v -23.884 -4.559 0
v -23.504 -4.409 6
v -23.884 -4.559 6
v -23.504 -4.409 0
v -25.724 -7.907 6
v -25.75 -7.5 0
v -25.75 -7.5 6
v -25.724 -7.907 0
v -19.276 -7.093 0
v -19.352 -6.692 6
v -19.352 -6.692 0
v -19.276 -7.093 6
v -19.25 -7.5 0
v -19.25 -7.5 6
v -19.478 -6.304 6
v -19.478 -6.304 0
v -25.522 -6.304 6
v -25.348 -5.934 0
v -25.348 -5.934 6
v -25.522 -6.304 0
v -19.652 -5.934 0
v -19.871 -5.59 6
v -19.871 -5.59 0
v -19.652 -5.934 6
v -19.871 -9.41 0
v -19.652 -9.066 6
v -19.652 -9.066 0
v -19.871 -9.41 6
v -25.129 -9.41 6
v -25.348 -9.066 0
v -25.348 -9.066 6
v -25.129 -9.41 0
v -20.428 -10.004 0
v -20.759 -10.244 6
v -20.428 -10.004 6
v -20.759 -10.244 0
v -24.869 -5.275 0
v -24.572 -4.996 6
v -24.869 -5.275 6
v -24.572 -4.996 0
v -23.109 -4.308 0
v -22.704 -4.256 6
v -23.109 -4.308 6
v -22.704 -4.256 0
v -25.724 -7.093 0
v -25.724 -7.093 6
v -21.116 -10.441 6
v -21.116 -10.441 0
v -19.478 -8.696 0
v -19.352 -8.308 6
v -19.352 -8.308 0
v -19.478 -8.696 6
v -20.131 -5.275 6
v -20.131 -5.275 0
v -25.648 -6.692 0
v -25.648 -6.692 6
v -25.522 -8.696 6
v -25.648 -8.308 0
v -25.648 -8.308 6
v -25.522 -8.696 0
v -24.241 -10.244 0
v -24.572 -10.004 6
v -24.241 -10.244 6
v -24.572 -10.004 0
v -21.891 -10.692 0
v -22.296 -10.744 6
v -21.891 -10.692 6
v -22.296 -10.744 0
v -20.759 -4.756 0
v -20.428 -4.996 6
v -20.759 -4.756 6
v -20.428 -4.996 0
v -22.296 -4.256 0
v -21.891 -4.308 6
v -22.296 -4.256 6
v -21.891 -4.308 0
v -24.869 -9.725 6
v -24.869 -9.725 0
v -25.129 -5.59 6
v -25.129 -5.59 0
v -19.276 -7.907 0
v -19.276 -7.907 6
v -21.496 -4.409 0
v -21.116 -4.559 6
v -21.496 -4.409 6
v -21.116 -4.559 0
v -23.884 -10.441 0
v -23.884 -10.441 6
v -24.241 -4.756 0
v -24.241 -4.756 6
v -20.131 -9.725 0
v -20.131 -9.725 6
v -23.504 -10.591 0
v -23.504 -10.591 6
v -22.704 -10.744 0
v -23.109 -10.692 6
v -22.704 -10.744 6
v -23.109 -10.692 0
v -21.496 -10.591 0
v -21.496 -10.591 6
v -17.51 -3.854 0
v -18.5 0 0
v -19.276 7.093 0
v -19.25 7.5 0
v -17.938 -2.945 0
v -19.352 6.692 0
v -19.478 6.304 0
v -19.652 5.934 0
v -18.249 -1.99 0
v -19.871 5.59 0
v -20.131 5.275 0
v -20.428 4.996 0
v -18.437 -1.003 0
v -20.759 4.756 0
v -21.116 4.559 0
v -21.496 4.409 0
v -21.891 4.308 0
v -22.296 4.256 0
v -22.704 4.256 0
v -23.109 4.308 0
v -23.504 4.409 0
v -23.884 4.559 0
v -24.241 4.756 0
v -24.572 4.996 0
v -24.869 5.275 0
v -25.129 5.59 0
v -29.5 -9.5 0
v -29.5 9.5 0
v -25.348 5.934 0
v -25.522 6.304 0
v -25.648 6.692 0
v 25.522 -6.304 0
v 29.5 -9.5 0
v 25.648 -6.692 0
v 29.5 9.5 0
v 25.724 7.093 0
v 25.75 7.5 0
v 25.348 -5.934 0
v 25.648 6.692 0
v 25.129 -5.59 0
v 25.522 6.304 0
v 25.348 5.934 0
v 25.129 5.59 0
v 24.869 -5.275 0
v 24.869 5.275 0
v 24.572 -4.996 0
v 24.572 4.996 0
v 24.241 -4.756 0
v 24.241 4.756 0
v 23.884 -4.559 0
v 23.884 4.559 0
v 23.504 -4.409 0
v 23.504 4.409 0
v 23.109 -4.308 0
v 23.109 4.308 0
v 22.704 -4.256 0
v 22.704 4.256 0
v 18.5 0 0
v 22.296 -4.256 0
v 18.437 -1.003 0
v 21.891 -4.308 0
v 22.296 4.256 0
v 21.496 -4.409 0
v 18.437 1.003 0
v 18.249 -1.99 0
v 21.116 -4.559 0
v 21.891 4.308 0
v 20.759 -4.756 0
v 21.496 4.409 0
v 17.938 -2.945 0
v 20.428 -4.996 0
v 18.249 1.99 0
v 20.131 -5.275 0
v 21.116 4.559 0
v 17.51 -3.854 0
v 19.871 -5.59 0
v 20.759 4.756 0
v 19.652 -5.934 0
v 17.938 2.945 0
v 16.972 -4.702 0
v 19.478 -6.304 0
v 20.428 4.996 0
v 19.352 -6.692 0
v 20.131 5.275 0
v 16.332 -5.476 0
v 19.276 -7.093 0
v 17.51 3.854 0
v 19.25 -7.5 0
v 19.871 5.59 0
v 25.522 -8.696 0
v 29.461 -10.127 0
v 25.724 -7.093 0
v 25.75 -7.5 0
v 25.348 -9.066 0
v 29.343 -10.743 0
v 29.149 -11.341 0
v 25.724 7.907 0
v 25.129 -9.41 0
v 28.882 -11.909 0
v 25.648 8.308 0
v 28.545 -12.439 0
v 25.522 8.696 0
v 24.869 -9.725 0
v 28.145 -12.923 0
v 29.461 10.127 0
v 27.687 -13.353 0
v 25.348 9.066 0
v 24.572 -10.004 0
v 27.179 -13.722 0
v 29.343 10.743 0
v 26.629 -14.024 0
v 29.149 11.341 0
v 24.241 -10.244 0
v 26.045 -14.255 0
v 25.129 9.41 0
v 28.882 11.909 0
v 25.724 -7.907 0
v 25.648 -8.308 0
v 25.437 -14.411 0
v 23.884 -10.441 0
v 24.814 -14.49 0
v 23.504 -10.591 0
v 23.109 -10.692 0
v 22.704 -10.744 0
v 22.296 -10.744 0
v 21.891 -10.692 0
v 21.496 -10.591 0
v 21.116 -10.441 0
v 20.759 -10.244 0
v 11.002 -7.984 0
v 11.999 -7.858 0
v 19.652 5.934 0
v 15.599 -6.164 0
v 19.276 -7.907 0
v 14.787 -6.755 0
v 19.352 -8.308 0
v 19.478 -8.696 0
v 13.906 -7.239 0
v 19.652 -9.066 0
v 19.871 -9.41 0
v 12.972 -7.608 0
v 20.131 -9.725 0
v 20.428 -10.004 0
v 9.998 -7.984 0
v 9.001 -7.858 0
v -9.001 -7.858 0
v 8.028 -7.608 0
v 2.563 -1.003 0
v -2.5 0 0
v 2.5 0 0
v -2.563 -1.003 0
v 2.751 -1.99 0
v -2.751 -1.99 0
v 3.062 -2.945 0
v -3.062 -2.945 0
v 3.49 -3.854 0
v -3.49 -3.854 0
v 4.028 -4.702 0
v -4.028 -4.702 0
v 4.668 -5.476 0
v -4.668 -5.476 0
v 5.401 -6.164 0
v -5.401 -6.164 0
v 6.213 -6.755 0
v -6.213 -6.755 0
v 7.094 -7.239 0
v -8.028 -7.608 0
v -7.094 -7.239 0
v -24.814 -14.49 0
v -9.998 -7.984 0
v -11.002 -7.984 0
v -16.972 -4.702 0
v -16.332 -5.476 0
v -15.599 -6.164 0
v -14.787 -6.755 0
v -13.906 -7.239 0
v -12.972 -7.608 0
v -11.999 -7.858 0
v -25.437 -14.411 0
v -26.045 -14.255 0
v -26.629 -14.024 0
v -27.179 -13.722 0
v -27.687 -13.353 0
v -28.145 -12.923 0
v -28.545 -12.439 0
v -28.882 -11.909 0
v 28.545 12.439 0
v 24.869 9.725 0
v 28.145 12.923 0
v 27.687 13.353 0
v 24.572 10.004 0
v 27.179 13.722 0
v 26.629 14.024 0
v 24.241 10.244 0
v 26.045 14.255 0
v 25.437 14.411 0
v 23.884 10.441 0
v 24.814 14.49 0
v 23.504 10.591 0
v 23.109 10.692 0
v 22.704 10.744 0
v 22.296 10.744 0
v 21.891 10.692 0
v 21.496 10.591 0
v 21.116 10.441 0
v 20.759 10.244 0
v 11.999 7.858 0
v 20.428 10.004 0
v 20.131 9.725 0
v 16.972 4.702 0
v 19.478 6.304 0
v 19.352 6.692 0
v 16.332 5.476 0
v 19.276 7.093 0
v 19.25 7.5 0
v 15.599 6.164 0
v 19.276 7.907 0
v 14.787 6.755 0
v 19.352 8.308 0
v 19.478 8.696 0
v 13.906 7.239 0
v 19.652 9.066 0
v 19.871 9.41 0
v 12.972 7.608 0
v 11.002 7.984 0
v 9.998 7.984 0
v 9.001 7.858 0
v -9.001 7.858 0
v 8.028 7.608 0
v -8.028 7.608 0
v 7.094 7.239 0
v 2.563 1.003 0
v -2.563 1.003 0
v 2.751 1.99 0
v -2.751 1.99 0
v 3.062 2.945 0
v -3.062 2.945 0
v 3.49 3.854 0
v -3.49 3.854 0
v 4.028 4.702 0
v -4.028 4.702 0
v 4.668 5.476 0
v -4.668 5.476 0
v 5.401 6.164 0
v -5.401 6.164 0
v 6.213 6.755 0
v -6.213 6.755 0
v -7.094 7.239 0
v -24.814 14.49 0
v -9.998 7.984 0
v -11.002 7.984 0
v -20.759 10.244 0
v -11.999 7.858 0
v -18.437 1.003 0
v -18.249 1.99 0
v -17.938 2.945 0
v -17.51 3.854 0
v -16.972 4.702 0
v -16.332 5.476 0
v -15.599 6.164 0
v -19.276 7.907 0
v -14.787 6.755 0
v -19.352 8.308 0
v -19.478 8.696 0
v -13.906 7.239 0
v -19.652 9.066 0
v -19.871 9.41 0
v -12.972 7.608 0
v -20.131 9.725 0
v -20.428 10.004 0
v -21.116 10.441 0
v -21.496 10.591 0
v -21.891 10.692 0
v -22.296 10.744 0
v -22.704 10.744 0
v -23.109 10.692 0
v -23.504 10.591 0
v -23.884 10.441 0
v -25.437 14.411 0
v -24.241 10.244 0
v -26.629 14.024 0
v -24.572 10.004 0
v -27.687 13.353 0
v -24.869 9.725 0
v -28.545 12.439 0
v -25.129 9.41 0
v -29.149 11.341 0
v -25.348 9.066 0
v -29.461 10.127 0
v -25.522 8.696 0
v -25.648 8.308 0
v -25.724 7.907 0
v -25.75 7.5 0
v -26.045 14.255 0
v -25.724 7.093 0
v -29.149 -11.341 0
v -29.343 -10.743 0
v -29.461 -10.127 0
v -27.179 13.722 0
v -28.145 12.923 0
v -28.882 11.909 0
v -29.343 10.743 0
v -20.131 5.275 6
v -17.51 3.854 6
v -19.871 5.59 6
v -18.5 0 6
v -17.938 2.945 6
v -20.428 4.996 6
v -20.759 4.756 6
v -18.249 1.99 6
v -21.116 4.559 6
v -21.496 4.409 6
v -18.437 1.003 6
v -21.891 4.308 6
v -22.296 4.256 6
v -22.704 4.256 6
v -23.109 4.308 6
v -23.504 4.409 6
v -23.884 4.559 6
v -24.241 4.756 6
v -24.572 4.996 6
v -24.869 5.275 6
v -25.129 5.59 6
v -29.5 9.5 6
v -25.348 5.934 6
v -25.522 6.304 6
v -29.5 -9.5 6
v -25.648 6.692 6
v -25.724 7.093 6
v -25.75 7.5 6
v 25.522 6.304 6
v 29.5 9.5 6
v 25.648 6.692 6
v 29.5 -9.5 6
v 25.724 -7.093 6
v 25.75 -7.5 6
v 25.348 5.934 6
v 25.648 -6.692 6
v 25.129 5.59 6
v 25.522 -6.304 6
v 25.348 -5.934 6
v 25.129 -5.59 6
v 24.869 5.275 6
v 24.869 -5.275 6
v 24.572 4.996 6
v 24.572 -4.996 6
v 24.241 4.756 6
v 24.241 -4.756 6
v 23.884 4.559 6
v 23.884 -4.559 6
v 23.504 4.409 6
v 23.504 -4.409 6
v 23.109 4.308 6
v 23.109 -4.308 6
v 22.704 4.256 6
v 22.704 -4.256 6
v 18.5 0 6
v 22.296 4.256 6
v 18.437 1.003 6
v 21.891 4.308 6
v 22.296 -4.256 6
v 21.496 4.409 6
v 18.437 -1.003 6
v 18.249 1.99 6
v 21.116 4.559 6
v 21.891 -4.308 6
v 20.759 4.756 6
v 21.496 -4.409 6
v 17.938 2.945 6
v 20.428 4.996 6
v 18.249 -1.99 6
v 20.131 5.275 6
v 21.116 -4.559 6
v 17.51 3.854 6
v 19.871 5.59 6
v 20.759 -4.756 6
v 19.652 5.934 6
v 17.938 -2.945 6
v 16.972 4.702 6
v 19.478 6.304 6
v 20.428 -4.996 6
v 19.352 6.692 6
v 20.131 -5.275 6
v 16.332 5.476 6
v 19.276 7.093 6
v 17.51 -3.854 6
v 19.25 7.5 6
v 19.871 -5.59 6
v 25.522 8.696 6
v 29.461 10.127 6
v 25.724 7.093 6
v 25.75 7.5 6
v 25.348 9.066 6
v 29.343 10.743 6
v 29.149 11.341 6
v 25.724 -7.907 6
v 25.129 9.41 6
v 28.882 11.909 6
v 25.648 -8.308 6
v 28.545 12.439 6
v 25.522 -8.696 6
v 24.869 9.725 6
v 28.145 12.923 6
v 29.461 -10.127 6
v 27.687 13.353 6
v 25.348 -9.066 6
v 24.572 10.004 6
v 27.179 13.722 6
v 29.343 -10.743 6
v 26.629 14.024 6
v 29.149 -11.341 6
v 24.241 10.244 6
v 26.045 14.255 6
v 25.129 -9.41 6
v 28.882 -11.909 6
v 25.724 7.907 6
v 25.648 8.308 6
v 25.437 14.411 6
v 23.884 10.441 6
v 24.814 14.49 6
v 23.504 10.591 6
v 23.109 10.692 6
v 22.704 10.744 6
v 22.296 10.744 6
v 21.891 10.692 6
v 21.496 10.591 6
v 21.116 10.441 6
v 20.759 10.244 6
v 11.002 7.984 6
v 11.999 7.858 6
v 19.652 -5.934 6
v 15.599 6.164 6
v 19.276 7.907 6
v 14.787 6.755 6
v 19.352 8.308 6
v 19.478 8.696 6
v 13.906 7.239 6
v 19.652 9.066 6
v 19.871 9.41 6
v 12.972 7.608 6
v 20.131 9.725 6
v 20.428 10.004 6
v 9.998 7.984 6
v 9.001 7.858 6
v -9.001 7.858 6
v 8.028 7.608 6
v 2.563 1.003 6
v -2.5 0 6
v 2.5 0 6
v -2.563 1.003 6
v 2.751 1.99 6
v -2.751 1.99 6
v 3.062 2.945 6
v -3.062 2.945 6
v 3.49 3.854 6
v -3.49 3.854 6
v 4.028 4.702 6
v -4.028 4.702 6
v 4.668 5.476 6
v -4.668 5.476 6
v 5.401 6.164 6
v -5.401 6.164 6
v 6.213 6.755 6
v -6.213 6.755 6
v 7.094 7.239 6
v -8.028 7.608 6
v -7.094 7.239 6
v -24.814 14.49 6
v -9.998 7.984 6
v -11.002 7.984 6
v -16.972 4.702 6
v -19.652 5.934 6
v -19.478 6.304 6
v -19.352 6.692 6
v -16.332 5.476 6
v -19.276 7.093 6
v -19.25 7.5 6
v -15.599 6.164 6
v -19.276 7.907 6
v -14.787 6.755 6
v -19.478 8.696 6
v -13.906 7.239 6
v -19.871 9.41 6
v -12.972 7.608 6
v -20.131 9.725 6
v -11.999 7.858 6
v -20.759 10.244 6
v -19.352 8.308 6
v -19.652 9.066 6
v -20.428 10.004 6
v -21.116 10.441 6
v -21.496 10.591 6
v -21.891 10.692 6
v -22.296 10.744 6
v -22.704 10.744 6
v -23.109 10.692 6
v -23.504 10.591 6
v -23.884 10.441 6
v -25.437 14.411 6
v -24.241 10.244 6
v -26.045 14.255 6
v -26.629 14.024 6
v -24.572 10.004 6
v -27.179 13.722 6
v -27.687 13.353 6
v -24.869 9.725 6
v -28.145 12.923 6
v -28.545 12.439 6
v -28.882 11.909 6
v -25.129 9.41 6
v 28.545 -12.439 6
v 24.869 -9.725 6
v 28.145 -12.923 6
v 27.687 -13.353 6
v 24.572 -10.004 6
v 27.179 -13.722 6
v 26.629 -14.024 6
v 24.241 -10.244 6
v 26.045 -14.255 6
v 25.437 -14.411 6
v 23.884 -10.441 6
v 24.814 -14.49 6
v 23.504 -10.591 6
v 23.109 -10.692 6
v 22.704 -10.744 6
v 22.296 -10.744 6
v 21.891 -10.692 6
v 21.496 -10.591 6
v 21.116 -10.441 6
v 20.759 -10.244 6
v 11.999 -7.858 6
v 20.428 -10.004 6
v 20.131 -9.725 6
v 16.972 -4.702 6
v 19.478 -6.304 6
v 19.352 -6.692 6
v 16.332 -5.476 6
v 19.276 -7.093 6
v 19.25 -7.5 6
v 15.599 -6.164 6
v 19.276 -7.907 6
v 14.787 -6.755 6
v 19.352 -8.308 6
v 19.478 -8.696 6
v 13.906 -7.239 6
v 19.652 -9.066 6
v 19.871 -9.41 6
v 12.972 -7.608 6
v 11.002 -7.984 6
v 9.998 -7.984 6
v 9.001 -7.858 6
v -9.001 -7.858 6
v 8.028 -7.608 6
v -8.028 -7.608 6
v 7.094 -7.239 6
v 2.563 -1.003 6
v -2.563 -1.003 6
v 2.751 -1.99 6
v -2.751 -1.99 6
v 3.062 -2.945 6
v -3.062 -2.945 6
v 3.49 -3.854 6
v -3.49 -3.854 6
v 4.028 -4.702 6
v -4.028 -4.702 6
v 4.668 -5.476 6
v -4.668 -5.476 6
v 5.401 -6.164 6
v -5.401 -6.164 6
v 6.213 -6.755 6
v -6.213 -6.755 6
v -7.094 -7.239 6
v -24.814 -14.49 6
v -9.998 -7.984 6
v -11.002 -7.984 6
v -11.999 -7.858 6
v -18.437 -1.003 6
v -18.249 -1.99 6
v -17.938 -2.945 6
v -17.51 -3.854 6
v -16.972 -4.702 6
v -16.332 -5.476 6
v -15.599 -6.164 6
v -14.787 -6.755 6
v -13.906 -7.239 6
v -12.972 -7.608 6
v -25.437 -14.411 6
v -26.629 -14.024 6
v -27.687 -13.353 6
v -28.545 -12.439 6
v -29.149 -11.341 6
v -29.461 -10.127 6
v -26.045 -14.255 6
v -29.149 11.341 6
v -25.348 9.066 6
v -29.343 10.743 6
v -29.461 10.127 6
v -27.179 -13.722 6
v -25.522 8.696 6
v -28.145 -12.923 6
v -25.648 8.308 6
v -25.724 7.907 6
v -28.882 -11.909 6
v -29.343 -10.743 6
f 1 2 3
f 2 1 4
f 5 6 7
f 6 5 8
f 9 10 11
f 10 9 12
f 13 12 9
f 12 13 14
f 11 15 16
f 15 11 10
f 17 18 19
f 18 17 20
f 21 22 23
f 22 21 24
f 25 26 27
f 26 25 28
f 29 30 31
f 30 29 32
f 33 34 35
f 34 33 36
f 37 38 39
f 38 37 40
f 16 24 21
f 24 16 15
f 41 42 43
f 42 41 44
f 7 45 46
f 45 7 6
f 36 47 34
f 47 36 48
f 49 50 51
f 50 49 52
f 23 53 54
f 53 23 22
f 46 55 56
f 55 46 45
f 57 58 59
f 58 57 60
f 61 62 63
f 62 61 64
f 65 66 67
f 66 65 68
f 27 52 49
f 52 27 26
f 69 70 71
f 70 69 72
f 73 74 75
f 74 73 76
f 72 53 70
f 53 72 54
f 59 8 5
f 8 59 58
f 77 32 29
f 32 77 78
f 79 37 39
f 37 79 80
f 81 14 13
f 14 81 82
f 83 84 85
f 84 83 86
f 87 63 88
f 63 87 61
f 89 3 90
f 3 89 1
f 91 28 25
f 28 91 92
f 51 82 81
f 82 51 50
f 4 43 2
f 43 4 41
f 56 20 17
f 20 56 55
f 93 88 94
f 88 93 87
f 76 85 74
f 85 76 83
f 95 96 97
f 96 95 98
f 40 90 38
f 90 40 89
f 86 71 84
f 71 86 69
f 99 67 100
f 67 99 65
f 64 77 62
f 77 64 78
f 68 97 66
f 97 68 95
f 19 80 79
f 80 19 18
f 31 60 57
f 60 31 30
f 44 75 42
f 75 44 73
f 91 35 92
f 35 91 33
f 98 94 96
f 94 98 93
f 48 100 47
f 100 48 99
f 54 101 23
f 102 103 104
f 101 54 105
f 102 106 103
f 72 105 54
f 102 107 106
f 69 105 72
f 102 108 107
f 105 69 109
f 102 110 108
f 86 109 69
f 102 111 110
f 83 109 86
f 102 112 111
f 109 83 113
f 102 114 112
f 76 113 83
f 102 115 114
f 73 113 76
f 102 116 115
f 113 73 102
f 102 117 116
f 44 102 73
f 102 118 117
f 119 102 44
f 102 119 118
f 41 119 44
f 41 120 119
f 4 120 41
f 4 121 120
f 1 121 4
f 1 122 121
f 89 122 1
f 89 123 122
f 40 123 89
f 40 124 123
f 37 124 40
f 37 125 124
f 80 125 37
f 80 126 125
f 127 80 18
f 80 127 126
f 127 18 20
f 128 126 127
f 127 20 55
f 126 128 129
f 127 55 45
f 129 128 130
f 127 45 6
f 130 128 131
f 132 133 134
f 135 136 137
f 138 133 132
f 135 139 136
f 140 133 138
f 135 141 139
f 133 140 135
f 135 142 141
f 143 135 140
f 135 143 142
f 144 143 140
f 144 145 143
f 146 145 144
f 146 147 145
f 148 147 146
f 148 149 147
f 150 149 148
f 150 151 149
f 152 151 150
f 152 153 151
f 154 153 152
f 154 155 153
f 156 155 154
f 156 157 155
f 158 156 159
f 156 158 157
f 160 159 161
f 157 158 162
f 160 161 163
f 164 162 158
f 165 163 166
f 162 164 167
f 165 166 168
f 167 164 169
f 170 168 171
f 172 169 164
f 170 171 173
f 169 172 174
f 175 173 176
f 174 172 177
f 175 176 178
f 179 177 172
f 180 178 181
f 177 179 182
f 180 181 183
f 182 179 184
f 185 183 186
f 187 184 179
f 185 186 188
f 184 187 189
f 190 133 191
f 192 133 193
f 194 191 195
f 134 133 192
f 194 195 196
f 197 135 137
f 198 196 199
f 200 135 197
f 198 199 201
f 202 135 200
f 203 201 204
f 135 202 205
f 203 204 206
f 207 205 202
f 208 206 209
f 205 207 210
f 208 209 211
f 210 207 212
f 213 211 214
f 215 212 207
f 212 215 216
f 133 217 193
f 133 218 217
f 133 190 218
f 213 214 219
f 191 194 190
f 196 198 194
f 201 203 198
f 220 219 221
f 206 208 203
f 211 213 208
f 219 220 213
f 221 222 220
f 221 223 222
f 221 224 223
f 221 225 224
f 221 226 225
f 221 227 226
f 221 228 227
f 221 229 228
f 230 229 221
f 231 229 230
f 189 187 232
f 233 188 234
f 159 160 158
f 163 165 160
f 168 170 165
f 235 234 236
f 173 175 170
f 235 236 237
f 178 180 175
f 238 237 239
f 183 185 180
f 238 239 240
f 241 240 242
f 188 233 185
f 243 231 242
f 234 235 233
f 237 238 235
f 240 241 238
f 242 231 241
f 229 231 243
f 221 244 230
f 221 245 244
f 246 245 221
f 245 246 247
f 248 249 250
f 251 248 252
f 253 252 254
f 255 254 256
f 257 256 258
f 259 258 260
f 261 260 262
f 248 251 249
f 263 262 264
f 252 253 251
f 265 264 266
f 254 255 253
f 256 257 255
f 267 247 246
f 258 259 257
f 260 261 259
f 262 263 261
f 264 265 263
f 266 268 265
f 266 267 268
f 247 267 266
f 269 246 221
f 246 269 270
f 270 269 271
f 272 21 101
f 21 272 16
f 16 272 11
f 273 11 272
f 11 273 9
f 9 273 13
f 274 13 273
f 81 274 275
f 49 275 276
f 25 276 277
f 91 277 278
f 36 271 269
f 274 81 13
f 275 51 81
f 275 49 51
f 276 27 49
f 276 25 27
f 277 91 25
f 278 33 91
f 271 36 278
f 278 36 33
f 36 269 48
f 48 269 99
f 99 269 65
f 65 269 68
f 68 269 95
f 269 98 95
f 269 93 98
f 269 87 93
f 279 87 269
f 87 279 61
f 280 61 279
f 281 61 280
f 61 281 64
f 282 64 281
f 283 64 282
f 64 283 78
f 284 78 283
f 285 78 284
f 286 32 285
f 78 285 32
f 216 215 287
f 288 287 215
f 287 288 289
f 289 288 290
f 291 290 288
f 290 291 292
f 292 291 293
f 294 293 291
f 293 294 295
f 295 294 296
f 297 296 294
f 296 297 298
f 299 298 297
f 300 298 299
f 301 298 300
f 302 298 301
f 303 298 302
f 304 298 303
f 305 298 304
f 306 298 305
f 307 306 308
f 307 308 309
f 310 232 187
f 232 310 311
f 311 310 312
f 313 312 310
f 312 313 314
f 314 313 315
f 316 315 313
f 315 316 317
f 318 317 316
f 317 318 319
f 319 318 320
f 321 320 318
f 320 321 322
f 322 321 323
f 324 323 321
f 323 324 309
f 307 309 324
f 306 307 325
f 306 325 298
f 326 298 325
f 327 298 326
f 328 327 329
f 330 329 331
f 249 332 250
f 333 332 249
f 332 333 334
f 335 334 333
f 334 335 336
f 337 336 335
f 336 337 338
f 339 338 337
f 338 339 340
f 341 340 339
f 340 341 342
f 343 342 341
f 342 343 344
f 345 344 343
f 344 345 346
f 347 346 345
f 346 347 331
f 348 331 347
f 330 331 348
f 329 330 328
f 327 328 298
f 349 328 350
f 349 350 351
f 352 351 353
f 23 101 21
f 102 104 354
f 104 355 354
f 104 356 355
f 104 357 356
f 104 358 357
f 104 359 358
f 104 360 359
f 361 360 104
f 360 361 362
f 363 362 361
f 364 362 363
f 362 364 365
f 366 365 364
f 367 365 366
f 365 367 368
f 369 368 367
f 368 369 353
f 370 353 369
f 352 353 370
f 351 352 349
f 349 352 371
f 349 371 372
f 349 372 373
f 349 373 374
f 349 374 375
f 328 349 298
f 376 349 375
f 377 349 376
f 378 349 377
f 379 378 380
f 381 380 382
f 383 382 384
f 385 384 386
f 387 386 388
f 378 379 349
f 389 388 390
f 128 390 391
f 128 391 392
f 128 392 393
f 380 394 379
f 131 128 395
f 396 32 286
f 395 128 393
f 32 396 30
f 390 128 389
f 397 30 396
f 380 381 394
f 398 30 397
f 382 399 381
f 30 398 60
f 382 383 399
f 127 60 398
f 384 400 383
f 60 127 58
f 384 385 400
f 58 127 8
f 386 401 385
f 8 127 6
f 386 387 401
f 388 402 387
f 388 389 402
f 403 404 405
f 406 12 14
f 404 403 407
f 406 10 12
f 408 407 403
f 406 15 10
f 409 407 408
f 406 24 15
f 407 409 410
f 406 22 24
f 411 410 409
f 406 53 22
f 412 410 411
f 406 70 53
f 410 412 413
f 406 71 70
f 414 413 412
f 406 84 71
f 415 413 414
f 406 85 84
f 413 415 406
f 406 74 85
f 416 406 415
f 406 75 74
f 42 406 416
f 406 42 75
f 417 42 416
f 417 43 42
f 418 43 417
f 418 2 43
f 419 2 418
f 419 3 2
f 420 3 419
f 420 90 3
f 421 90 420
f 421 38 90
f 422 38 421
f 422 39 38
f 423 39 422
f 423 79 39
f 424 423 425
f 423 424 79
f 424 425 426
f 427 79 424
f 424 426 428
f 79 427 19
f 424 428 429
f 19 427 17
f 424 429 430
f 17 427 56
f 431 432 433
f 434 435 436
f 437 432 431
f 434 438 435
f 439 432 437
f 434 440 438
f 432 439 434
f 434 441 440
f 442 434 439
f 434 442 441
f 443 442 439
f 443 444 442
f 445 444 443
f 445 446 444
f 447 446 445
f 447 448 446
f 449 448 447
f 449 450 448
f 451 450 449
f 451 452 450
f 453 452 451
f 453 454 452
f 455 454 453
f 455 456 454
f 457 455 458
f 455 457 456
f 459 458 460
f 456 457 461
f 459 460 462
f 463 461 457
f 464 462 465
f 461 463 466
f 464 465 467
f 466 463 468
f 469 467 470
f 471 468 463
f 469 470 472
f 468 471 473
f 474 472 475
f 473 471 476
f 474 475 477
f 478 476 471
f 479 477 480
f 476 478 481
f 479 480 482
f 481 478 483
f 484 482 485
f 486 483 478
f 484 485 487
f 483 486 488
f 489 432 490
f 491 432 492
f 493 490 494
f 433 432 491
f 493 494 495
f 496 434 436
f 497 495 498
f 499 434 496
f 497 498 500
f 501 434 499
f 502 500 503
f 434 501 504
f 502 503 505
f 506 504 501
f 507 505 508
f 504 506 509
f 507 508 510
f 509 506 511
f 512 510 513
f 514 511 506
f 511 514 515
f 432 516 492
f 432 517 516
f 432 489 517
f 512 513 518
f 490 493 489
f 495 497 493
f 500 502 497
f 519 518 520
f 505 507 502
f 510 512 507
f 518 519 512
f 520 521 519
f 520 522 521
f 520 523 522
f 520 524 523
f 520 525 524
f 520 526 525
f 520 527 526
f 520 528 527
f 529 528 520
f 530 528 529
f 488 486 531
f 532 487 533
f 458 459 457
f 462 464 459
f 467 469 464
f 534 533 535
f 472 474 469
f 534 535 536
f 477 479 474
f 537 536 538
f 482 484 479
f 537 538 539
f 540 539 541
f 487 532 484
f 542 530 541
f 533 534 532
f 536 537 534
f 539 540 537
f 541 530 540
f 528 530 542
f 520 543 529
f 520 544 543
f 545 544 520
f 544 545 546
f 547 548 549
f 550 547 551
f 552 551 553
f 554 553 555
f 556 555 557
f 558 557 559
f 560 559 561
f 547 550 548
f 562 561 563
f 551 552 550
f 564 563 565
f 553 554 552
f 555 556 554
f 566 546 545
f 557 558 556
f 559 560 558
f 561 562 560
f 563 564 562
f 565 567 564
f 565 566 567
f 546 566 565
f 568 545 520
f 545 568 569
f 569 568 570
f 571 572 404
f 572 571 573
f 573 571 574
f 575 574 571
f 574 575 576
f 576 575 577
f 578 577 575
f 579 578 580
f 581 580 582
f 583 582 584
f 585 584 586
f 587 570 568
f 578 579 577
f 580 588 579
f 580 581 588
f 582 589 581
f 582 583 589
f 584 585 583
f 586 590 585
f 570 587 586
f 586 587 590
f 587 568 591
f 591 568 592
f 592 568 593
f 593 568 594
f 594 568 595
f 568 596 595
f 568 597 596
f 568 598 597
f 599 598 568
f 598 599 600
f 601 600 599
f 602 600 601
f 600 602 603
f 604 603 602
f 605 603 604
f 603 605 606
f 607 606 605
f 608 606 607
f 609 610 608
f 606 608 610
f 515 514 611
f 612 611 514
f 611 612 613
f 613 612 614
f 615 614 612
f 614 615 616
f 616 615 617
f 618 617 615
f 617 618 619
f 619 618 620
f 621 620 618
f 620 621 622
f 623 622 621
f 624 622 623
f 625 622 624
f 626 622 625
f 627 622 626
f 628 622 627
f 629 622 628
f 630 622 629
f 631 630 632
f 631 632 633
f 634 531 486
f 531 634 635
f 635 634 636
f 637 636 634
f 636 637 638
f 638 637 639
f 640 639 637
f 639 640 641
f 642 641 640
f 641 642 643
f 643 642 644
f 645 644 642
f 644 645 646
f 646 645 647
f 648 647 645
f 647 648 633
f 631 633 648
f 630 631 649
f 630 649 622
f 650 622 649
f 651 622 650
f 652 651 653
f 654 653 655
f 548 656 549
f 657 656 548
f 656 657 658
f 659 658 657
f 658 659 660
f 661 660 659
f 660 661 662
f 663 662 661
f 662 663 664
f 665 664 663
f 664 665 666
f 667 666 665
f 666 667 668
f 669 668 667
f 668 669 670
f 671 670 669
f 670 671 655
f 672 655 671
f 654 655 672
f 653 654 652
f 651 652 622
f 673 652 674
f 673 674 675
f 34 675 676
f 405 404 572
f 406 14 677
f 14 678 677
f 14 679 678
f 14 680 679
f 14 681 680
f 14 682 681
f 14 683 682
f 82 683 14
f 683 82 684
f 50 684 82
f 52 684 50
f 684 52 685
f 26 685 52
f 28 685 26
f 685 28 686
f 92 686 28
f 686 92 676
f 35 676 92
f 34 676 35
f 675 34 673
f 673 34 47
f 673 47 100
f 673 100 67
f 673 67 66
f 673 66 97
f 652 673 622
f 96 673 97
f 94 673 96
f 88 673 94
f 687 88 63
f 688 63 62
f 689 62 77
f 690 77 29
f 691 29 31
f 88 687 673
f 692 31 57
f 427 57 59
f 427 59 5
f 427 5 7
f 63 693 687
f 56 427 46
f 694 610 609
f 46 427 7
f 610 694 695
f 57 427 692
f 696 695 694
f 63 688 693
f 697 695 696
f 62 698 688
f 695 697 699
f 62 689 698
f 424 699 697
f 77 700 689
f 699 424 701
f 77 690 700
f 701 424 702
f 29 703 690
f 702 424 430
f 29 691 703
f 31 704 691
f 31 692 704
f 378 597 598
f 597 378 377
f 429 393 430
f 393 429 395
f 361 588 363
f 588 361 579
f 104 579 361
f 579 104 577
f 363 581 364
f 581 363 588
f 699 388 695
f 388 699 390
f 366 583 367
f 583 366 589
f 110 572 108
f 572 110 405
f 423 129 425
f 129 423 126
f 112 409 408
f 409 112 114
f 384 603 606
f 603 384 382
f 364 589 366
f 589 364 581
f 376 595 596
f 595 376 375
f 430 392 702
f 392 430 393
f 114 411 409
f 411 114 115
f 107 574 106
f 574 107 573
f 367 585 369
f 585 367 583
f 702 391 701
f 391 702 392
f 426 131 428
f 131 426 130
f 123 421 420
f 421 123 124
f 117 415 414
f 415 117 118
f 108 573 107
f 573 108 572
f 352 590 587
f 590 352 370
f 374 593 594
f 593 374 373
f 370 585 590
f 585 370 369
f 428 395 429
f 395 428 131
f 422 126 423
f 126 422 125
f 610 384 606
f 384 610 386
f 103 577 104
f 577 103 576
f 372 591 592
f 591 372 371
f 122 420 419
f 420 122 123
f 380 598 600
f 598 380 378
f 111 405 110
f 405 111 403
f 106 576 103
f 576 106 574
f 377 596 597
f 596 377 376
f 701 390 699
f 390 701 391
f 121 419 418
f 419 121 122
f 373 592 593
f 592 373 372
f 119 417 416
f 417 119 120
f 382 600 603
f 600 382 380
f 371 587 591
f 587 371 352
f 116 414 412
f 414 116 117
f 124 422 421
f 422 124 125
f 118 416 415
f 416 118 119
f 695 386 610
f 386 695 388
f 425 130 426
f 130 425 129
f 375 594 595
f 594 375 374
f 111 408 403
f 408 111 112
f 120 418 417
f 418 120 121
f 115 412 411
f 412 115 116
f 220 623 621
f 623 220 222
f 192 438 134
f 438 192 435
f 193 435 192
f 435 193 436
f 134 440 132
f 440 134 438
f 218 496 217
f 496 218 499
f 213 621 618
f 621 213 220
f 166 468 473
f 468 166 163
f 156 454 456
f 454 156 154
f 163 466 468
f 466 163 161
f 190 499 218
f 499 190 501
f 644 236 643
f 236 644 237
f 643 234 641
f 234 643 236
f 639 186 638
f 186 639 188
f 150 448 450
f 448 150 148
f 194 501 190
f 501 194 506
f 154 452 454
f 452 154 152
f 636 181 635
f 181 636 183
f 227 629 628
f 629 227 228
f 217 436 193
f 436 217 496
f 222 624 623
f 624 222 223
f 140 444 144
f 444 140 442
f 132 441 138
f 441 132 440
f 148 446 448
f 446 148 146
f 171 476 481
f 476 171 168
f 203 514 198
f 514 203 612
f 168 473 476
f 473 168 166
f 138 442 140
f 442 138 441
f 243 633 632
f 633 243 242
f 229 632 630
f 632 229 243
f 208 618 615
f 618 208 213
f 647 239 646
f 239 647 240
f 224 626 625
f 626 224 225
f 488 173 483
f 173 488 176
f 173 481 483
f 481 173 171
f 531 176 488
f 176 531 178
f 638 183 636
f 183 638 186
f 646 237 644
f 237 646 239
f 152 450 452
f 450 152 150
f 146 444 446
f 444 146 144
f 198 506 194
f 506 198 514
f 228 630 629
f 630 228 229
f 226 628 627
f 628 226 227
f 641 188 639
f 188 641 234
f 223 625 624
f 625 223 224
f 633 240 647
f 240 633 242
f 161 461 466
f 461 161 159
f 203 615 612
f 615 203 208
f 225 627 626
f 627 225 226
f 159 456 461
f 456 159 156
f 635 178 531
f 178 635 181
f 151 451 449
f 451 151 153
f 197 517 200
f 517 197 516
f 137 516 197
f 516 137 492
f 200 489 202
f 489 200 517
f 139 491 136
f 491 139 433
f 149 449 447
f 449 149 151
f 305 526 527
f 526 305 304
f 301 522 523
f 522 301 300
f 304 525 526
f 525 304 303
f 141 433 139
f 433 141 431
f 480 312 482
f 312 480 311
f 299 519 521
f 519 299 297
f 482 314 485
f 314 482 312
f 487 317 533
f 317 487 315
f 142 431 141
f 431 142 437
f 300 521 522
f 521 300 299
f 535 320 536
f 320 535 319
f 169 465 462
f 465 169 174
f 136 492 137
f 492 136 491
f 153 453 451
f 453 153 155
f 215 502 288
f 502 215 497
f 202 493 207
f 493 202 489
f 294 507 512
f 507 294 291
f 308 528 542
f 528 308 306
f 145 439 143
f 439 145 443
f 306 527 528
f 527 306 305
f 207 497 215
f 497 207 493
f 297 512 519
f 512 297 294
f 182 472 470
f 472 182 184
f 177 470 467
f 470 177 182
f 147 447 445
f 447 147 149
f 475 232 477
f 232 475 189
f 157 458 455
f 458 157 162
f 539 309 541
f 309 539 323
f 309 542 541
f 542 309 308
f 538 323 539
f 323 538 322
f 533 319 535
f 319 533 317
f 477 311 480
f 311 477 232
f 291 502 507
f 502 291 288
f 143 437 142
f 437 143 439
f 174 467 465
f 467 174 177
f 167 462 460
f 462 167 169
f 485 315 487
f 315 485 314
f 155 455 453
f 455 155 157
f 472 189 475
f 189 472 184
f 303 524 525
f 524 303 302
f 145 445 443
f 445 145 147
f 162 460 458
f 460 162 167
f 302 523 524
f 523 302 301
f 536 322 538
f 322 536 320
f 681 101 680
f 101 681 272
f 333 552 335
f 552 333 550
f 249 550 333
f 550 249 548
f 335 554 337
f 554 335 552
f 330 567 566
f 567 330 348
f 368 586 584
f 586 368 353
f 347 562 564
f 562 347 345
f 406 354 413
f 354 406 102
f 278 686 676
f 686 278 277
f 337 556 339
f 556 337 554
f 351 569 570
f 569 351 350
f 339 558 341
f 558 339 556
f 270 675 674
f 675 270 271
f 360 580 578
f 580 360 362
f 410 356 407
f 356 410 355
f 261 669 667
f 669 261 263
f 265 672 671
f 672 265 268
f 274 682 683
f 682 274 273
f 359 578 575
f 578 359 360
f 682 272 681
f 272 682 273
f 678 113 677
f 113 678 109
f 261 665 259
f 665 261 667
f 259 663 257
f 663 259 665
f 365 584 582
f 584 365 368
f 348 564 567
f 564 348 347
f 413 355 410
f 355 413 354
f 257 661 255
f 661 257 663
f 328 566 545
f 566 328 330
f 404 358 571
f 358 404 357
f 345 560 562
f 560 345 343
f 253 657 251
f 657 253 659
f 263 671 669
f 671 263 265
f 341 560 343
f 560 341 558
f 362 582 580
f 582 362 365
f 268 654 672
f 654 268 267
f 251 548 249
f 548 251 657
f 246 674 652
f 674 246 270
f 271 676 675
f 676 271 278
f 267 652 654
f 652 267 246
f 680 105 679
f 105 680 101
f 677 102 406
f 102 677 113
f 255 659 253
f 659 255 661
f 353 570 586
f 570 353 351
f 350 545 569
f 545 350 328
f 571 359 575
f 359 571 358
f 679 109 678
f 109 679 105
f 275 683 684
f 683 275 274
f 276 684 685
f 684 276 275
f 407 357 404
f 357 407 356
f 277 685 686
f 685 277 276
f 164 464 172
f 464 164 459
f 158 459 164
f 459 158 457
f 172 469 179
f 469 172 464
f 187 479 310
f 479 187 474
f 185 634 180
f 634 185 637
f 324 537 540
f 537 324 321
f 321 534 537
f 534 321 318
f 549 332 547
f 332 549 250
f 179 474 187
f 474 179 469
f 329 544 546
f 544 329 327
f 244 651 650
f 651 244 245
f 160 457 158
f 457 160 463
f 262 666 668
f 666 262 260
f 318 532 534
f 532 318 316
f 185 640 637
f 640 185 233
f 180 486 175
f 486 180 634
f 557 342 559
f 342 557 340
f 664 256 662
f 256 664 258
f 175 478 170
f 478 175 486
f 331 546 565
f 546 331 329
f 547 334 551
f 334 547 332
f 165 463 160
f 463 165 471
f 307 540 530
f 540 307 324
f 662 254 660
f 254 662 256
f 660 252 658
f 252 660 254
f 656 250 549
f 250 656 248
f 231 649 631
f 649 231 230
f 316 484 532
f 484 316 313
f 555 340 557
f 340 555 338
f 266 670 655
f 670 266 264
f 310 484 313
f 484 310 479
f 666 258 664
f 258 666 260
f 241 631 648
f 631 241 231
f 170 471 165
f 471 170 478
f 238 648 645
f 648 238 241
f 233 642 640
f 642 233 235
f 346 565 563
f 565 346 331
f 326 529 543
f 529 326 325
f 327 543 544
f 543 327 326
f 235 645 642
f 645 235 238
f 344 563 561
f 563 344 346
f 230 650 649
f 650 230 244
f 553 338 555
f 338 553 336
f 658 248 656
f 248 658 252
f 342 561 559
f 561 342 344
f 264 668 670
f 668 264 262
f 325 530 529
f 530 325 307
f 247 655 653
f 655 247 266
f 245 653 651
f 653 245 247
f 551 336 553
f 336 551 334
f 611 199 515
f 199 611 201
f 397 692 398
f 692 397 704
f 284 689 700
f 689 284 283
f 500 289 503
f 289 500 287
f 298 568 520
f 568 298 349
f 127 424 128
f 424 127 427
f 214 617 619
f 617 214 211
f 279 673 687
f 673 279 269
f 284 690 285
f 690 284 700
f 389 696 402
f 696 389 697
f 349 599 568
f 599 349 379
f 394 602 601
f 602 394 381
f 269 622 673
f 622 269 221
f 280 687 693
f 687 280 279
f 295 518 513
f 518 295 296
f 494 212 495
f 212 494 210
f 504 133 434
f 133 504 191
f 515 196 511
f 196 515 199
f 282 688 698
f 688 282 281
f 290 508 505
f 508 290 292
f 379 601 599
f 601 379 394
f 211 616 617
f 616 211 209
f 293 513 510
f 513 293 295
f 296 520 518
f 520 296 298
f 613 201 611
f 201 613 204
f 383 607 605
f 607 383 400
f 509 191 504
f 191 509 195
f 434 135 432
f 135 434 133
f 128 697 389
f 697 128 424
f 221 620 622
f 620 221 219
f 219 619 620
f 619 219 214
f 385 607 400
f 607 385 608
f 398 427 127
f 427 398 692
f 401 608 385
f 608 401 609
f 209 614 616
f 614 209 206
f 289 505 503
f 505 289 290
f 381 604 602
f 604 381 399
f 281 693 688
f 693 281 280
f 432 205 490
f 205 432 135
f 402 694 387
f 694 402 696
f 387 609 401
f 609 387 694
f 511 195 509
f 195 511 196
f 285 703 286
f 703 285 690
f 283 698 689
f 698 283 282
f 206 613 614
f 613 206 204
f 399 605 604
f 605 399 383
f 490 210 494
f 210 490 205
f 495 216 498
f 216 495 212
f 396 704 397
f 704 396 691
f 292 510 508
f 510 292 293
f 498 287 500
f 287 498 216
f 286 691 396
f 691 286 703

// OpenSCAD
$fn = 50;

difference() {
	union() {
		hull() {
			translate(v = [-24.5, 9.5, 0]) {
				cylinder(h = 6, r = 5);
			}
			translate(v = [24.5, 9.5, 0]) {
				cylinder(h = 6, r = 5);
			}
			translate(v = [-24.5, -9.5, 0]) {
				cylinder(h = 6, r = 5);
			}
			translate(v = [24.5, -9.5, 0]) {
				cylinder(h = 6, r = 5);
			}
		}
	}
	union() {
		translate(v = [-22.5, -7.5, 0]) {
			cylinder(h = 6, r = 3.25);
		}
		translate(v = [-22.5, 7.5, 0]) {
			cylinder(h = 6, r = 3.25);
		}
		translate(v = [22.5, -7.5, 0]) {
			cylinder(h = 6, r = 3.25);
		}
		translate(v = [22.5, 7.5, 0]) {
			cylinder(h = 6, r = 3.25);
		}
		translate(v = [-10.5, 0, 0.0]) {
			cylinder(h = 6, r = 8.0);
		}
		translate(v = [10.5, 0, 0.0]) {
			cylinder(h = 6, r = 8.0);
		}
	}
}
